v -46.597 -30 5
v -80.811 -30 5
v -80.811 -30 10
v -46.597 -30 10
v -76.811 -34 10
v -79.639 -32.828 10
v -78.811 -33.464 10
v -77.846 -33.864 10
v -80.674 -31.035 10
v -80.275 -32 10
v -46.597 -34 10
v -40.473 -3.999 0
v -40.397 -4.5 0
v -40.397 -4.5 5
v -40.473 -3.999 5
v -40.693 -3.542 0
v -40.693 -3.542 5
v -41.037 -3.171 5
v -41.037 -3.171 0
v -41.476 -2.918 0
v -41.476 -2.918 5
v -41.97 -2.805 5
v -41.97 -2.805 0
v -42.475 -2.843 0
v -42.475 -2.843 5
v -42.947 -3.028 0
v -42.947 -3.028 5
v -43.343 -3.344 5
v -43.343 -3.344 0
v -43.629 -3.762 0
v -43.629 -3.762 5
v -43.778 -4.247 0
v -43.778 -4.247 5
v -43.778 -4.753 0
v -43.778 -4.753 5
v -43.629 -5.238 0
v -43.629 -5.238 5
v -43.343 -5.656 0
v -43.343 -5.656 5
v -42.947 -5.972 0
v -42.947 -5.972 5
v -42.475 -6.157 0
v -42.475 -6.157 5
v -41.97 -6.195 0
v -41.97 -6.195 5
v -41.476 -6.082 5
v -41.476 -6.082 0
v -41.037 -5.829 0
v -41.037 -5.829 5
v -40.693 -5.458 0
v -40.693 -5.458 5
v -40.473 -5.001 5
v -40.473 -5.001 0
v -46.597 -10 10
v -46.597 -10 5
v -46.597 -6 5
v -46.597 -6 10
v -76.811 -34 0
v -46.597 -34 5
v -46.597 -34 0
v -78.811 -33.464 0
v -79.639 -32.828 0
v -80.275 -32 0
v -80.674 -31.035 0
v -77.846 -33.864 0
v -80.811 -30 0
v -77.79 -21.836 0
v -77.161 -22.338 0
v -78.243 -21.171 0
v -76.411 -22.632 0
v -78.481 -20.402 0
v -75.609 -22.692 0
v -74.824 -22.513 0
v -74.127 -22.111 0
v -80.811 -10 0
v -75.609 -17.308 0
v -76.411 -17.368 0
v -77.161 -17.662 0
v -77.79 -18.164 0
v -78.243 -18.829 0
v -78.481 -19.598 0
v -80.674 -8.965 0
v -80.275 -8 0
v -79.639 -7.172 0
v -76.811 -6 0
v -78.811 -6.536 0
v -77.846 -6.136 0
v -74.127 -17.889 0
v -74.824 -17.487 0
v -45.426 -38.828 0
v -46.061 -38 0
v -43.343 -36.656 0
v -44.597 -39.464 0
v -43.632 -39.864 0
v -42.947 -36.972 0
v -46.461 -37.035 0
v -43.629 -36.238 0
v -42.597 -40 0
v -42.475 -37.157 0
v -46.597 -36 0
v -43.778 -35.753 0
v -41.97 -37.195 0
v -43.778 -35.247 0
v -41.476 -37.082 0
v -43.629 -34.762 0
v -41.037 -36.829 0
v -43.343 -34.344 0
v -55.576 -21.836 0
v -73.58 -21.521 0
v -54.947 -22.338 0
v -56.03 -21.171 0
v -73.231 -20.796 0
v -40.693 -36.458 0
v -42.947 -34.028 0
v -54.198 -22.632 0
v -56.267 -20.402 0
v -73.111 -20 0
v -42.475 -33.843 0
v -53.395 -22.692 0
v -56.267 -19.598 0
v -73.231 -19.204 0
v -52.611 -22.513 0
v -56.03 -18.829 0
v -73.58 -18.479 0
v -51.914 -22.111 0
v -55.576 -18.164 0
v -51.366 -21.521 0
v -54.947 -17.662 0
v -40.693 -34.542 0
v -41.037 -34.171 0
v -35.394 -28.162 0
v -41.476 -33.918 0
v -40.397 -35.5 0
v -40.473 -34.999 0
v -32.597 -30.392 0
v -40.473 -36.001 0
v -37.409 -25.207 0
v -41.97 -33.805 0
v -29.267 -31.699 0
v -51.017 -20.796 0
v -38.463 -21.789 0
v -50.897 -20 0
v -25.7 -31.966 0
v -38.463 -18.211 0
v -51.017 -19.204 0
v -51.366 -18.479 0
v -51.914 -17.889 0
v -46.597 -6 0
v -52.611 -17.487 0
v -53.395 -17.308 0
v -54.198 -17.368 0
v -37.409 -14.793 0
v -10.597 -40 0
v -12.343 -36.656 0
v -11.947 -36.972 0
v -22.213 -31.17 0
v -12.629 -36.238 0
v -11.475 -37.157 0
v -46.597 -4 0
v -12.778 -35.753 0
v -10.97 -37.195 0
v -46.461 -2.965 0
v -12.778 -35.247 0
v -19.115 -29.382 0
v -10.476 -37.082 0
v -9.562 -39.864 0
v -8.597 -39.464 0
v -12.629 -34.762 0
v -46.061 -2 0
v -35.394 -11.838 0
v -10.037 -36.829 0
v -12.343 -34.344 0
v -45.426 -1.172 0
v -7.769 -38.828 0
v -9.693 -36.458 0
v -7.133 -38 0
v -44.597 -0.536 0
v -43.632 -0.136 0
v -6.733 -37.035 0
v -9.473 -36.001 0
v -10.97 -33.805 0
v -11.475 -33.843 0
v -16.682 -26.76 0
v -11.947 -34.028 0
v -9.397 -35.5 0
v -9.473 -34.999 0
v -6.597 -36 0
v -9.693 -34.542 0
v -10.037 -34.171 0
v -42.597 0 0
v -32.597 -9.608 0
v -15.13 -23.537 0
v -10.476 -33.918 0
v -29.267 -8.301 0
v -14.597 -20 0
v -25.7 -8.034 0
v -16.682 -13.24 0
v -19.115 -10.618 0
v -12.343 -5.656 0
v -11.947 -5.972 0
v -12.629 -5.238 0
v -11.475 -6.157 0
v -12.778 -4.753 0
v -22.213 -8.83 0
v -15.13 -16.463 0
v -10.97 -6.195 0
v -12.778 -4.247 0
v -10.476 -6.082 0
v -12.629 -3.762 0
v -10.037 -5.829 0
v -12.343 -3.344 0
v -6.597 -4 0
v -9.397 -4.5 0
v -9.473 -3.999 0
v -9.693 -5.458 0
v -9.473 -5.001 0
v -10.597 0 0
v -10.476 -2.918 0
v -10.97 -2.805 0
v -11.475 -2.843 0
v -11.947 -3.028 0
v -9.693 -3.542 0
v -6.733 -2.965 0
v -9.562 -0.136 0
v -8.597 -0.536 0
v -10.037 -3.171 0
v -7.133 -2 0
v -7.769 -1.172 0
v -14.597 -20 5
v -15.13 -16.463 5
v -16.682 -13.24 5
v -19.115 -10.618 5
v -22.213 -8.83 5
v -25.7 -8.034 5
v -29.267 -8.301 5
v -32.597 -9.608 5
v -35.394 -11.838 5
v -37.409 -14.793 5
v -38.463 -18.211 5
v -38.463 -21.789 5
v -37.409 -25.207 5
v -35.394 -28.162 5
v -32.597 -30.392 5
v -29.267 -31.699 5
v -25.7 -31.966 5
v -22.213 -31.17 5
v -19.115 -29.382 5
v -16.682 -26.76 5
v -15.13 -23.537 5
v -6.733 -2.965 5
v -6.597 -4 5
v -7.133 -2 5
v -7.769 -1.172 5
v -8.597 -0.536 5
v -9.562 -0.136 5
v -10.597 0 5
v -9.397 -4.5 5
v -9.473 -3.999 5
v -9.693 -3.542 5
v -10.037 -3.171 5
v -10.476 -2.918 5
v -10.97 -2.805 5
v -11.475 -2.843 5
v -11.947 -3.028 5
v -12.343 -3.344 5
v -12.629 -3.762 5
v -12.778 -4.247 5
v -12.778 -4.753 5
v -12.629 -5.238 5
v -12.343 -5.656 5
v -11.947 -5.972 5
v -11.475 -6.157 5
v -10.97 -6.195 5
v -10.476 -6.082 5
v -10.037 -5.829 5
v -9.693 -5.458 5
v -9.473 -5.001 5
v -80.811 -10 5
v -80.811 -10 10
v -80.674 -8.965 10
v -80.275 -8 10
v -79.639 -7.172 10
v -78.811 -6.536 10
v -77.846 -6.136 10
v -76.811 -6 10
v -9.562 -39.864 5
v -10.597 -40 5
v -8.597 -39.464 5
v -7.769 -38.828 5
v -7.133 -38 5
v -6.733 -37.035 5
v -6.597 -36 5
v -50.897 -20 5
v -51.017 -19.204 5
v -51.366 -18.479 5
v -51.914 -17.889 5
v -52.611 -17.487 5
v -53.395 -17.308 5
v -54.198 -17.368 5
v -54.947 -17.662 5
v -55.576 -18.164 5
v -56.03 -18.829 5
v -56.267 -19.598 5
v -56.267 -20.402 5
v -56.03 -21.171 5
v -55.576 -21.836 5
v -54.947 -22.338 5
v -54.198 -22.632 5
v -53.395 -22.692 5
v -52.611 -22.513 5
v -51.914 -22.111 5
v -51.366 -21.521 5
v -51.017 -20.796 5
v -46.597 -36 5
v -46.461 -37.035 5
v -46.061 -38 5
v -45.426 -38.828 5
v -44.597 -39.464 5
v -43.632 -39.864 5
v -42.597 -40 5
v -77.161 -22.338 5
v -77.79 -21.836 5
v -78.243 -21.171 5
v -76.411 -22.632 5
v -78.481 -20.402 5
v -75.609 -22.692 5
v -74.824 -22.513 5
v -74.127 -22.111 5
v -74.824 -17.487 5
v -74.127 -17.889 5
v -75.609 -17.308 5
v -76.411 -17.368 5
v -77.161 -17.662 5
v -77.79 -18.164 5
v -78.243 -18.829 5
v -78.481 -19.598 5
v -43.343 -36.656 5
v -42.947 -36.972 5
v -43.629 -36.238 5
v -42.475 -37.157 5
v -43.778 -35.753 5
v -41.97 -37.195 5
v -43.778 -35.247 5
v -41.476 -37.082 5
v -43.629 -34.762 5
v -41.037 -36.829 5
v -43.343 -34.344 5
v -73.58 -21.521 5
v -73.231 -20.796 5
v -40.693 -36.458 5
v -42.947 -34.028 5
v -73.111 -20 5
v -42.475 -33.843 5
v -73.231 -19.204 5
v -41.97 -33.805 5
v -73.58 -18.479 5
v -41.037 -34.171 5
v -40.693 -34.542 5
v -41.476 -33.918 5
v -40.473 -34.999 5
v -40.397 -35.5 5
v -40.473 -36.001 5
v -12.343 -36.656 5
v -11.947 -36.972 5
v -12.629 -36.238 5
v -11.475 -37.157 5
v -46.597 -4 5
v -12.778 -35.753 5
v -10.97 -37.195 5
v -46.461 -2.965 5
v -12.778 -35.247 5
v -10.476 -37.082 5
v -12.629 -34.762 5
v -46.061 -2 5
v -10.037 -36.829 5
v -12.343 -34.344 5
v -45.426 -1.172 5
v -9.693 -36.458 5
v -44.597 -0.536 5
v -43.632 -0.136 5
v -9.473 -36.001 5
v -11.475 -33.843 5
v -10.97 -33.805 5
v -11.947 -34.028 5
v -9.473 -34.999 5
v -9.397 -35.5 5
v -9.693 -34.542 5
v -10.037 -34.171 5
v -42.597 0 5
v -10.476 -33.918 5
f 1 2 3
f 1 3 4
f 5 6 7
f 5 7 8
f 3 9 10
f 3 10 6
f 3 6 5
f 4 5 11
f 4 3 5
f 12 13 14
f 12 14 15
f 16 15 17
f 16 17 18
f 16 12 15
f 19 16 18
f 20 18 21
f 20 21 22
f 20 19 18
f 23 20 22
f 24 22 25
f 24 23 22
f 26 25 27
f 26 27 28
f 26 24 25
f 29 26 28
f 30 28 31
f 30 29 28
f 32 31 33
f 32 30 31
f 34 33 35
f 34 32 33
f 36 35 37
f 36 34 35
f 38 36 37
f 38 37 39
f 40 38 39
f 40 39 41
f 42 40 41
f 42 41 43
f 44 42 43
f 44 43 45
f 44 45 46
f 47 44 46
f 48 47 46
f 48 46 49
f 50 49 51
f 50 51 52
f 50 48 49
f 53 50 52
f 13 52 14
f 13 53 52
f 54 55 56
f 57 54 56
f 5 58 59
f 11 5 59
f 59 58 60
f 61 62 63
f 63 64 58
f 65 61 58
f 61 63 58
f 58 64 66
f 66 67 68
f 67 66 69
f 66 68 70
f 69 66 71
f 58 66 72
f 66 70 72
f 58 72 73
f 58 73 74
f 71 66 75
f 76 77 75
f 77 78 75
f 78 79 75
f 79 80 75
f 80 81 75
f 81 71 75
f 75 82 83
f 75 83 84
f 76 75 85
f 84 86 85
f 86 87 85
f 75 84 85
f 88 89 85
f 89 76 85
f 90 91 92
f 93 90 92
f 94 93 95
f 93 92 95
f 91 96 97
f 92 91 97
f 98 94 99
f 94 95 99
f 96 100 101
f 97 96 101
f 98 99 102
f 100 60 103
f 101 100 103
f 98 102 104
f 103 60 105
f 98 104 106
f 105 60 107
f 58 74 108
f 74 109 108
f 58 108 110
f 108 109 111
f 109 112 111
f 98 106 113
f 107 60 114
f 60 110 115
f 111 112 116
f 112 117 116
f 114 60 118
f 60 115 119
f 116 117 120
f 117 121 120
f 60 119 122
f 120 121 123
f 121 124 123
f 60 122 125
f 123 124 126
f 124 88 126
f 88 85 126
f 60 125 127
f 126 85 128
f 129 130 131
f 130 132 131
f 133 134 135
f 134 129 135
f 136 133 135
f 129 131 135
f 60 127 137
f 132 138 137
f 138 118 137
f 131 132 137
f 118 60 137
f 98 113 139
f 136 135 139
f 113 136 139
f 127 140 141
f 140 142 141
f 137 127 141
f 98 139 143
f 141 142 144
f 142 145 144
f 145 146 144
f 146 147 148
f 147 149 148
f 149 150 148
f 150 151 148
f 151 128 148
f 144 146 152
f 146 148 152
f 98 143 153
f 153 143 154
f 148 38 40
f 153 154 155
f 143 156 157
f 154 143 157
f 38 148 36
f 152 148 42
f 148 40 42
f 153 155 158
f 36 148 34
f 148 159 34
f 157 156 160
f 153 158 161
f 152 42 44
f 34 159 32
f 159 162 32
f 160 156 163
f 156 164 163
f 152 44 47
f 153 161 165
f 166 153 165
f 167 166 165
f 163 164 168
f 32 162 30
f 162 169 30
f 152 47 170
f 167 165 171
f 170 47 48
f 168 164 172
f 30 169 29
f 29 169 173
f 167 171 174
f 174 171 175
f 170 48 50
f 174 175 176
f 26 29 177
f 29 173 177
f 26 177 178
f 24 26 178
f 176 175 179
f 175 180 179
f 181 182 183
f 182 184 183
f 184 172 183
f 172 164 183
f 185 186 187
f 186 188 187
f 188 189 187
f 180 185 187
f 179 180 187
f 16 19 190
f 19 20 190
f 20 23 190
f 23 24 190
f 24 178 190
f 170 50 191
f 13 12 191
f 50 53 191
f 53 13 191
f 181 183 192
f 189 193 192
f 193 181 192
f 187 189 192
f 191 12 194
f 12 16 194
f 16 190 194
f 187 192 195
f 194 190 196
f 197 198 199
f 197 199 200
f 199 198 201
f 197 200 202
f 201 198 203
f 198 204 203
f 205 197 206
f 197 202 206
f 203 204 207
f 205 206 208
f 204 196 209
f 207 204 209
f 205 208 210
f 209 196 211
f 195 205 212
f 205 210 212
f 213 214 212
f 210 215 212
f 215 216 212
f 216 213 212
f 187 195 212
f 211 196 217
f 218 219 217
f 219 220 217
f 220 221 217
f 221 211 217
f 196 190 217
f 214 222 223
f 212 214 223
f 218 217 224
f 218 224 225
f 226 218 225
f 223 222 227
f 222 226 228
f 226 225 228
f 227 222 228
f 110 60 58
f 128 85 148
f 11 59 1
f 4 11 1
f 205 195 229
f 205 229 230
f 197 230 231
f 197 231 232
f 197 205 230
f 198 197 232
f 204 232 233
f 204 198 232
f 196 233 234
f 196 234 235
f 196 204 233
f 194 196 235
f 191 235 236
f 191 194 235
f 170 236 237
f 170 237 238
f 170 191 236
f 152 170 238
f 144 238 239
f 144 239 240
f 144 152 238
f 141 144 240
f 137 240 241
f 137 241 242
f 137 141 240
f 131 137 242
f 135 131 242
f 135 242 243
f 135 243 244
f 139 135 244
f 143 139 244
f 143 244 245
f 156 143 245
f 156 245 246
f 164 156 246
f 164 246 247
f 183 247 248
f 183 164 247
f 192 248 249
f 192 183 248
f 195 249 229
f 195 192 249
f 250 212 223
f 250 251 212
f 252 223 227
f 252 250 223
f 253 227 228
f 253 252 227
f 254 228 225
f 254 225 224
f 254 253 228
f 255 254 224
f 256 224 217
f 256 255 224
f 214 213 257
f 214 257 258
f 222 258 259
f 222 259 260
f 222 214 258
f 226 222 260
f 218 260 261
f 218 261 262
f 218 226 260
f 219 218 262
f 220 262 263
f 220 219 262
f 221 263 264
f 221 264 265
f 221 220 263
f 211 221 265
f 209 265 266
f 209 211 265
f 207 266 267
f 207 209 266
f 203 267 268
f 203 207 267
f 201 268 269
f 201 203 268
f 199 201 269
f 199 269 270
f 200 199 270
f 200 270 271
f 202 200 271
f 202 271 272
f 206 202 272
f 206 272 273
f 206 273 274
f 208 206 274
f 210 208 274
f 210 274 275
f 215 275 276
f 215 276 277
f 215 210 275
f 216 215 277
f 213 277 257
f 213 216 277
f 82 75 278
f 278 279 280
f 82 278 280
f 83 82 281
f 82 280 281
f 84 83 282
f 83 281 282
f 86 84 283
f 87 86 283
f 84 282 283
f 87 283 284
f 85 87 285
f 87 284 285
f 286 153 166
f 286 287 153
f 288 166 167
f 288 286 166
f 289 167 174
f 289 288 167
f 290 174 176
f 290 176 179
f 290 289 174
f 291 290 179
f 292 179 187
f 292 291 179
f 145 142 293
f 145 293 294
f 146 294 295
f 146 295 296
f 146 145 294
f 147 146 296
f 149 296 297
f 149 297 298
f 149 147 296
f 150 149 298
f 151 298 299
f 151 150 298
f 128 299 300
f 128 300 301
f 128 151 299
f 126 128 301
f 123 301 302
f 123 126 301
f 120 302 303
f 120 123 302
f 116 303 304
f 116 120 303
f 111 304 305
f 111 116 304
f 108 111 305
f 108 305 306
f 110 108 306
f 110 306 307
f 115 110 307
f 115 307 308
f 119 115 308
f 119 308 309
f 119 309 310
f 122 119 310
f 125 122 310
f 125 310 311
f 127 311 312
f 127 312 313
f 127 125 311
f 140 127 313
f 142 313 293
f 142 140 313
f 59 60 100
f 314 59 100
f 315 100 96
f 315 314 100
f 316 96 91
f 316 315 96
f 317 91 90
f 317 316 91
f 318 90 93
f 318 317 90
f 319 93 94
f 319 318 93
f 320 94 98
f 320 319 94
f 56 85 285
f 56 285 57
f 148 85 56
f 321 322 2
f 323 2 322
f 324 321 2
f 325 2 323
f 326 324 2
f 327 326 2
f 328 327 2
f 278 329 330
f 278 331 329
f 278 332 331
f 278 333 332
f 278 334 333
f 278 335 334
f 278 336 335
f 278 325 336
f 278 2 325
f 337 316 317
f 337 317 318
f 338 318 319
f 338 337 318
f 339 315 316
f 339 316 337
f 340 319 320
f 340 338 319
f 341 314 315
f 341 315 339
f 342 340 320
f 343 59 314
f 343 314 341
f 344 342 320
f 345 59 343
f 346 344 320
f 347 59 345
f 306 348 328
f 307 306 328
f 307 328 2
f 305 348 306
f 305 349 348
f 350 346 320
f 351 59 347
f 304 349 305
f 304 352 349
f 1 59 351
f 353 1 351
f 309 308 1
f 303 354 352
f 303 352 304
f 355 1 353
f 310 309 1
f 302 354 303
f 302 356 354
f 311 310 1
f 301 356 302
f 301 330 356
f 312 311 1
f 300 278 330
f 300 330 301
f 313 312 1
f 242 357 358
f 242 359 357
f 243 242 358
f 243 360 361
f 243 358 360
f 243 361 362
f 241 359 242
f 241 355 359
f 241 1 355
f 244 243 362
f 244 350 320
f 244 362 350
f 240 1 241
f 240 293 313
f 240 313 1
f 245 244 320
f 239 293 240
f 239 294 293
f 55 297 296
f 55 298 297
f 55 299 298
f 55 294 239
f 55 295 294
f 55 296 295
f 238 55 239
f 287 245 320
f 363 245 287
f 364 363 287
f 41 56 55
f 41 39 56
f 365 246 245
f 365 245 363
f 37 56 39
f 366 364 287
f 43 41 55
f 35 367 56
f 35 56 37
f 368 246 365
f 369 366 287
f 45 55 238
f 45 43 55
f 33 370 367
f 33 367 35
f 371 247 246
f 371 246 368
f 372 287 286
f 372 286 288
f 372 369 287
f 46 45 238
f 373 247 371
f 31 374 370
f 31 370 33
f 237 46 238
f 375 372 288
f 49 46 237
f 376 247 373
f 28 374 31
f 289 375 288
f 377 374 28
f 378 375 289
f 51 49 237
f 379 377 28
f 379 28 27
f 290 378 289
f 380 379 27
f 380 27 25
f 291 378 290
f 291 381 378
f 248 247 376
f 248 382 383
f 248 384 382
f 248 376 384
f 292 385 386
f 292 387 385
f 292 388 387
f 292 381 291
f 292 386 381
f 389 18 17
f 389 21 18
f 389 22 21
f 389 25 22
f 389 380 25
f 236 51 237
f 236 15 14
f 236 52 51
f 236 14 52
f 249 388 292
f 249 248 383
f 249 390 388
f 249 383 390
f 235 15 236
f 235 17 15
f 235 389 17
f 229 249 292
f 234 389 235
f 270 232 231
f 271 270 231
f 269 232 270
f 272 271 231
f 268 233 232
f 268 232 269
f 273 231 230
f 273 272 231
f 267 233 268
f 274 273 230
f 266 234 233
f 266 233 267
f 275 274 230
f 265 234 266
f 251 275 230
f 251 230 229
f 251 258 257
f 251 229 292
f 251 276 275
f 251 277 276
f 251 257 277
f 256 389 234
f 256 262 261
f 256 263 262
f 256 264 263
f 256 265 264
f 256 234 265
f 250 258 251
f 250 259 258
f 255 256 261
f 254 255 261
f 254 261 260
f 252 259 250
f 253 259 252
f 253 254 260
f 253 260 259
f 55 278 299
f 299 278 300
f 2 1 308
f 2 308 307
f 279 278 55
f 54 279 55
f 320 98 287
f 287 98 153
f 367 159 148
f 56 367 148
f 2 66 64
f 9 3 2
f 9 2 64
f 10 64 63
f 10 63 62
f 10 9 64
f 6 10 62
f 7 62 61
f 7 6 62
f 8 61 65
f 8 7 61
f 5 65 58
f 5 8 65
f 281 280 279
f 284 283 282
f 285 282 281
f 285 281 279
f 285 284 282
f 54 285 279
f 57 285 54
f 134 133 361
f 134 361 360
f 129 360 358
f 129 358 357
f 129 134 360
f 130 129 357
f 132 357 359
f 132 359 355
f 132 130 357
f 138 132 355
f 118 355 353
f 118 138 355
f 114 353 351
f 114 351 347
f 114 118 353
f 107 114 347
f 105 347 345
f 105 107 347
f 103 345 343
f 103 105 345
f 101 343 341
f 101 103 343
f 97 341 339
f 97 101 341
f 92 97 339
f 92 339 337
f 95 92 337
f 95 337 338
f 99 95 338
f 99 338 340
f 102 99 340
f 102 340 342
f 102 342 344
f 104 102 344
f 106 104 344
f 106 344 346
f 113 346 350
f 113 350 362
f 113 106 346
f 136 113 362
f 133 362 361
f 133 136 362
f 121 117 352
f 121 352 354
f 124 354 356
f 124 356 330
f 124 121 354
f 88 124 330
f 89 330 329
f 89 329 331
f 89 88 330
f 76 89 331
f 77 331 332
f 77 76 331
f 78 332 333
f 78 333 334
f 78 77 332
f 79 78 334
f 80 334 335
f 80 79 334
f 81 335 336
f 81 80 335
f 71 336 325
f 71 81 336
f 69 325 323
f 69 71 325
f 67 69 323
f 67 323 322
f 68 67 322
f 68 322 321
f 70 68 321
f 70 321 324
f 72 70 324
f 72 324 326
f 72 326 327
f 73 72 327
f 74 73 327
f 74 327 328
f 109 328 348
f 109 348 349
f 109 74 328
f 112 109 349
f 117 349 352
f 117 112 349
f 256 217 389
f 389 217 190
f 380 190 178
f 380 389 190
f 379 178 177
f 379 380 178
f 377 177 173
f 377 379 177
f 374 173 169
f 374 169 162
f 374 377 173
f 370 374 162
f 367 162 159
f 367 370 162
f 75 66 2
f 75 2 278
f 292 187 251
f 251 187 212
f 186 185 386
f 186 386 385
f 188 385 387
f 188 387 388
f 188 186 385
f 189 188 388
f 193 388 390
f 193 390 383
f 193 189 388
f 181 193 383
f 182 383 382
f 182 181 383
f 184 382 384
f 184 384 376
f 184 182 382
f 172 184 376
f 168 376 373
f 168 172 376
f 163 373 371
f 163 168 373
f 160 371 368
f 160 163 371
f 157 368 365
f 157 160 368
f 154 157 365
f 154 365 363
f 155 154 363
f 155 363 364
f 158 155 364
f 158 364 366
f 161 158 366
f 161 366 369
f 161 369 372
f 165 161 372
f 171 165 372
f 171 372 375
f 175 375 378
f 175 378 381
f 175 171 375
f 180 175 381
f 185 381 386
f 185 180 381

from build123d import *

# Parameters (mm, degrees)
F0_W     = 34.213527
F0_H     = 20
F0_R     = 2.7
F0_R_2   = 1.7
F0_R_3   = 12
F1_DEPTH = 5
F0_H_2   = 4
F2_DEPTH = 10
F3_R     = 4


with BuildPart() as f1:
    # F0 (on Top) → F1 (new body)
    with BuildSketch(Plane.XY):
        with Locations((-63.703899, -20)):
            Rectangle(F0_W, F0_H)
        with Locations((-75.810663, -20)):
            Circle(F0_R, mode=Mode.SUBTRACT)
        with Locations((-53.597136, -20)):
            Circle(F0_R, mode=Mode.SUBTRACT)
        Polygon((-46.597136, -40), (-6.597136, -40), (-6.597136, 0), (-46.597136, 0), (-46.597136, -6), (-46.597136, -10), (-46.597136, -30), (-46.597136, -34), align=None)
        with Locations((-42.097136, -35.5)):
            Circle(F0_R_2, mode=Mode.SUBTRACT)
        with Locations((-11.097136, -35.5)):
            Circle(F0_R_2, mode=Mode.SUBTRACT)
        with Locations((-26.597136, -20)):
            Circle(F0_R_3, mode=Mode.SUBTRACT)
        with Locations((-42.097136, -4.5)):
            Circle(F0_R_2, mode=Mode.SUBTRACT)
        with Locations((-11.097136, -4.5)):
            Circle(F0_R_2, mode=Mode.SUBTRACT)
    extrude(amount=F1_DEPTH)

    # F0 (on Top) → F2 (join)
    with BuildSketch(Plane.XY):
        with Locations((-63.703899, -8)):
            Rectangle(F0_W, F0_H_2)
        with Locations((-63.703899, -32)):
            Rectangle(F0_W, F0_H_2)
    extrude(amount=F2_DEPTH)

    # F3
    f3_edges = [f1.edges().sort_by_distance(p)[0] for p in [
        (-80.810663, -6, 5),
        (-46.597136, 0, 2.5),
        (-6.597136, 0, 2.5),
        (-6.597136, -40, 2.5),
        (-46.597136, -40, 2.5),
        (-80.810663, -34, 5),
    ]]
    fillet(f3_edges, radius=F3_R)


solid = f1.part
